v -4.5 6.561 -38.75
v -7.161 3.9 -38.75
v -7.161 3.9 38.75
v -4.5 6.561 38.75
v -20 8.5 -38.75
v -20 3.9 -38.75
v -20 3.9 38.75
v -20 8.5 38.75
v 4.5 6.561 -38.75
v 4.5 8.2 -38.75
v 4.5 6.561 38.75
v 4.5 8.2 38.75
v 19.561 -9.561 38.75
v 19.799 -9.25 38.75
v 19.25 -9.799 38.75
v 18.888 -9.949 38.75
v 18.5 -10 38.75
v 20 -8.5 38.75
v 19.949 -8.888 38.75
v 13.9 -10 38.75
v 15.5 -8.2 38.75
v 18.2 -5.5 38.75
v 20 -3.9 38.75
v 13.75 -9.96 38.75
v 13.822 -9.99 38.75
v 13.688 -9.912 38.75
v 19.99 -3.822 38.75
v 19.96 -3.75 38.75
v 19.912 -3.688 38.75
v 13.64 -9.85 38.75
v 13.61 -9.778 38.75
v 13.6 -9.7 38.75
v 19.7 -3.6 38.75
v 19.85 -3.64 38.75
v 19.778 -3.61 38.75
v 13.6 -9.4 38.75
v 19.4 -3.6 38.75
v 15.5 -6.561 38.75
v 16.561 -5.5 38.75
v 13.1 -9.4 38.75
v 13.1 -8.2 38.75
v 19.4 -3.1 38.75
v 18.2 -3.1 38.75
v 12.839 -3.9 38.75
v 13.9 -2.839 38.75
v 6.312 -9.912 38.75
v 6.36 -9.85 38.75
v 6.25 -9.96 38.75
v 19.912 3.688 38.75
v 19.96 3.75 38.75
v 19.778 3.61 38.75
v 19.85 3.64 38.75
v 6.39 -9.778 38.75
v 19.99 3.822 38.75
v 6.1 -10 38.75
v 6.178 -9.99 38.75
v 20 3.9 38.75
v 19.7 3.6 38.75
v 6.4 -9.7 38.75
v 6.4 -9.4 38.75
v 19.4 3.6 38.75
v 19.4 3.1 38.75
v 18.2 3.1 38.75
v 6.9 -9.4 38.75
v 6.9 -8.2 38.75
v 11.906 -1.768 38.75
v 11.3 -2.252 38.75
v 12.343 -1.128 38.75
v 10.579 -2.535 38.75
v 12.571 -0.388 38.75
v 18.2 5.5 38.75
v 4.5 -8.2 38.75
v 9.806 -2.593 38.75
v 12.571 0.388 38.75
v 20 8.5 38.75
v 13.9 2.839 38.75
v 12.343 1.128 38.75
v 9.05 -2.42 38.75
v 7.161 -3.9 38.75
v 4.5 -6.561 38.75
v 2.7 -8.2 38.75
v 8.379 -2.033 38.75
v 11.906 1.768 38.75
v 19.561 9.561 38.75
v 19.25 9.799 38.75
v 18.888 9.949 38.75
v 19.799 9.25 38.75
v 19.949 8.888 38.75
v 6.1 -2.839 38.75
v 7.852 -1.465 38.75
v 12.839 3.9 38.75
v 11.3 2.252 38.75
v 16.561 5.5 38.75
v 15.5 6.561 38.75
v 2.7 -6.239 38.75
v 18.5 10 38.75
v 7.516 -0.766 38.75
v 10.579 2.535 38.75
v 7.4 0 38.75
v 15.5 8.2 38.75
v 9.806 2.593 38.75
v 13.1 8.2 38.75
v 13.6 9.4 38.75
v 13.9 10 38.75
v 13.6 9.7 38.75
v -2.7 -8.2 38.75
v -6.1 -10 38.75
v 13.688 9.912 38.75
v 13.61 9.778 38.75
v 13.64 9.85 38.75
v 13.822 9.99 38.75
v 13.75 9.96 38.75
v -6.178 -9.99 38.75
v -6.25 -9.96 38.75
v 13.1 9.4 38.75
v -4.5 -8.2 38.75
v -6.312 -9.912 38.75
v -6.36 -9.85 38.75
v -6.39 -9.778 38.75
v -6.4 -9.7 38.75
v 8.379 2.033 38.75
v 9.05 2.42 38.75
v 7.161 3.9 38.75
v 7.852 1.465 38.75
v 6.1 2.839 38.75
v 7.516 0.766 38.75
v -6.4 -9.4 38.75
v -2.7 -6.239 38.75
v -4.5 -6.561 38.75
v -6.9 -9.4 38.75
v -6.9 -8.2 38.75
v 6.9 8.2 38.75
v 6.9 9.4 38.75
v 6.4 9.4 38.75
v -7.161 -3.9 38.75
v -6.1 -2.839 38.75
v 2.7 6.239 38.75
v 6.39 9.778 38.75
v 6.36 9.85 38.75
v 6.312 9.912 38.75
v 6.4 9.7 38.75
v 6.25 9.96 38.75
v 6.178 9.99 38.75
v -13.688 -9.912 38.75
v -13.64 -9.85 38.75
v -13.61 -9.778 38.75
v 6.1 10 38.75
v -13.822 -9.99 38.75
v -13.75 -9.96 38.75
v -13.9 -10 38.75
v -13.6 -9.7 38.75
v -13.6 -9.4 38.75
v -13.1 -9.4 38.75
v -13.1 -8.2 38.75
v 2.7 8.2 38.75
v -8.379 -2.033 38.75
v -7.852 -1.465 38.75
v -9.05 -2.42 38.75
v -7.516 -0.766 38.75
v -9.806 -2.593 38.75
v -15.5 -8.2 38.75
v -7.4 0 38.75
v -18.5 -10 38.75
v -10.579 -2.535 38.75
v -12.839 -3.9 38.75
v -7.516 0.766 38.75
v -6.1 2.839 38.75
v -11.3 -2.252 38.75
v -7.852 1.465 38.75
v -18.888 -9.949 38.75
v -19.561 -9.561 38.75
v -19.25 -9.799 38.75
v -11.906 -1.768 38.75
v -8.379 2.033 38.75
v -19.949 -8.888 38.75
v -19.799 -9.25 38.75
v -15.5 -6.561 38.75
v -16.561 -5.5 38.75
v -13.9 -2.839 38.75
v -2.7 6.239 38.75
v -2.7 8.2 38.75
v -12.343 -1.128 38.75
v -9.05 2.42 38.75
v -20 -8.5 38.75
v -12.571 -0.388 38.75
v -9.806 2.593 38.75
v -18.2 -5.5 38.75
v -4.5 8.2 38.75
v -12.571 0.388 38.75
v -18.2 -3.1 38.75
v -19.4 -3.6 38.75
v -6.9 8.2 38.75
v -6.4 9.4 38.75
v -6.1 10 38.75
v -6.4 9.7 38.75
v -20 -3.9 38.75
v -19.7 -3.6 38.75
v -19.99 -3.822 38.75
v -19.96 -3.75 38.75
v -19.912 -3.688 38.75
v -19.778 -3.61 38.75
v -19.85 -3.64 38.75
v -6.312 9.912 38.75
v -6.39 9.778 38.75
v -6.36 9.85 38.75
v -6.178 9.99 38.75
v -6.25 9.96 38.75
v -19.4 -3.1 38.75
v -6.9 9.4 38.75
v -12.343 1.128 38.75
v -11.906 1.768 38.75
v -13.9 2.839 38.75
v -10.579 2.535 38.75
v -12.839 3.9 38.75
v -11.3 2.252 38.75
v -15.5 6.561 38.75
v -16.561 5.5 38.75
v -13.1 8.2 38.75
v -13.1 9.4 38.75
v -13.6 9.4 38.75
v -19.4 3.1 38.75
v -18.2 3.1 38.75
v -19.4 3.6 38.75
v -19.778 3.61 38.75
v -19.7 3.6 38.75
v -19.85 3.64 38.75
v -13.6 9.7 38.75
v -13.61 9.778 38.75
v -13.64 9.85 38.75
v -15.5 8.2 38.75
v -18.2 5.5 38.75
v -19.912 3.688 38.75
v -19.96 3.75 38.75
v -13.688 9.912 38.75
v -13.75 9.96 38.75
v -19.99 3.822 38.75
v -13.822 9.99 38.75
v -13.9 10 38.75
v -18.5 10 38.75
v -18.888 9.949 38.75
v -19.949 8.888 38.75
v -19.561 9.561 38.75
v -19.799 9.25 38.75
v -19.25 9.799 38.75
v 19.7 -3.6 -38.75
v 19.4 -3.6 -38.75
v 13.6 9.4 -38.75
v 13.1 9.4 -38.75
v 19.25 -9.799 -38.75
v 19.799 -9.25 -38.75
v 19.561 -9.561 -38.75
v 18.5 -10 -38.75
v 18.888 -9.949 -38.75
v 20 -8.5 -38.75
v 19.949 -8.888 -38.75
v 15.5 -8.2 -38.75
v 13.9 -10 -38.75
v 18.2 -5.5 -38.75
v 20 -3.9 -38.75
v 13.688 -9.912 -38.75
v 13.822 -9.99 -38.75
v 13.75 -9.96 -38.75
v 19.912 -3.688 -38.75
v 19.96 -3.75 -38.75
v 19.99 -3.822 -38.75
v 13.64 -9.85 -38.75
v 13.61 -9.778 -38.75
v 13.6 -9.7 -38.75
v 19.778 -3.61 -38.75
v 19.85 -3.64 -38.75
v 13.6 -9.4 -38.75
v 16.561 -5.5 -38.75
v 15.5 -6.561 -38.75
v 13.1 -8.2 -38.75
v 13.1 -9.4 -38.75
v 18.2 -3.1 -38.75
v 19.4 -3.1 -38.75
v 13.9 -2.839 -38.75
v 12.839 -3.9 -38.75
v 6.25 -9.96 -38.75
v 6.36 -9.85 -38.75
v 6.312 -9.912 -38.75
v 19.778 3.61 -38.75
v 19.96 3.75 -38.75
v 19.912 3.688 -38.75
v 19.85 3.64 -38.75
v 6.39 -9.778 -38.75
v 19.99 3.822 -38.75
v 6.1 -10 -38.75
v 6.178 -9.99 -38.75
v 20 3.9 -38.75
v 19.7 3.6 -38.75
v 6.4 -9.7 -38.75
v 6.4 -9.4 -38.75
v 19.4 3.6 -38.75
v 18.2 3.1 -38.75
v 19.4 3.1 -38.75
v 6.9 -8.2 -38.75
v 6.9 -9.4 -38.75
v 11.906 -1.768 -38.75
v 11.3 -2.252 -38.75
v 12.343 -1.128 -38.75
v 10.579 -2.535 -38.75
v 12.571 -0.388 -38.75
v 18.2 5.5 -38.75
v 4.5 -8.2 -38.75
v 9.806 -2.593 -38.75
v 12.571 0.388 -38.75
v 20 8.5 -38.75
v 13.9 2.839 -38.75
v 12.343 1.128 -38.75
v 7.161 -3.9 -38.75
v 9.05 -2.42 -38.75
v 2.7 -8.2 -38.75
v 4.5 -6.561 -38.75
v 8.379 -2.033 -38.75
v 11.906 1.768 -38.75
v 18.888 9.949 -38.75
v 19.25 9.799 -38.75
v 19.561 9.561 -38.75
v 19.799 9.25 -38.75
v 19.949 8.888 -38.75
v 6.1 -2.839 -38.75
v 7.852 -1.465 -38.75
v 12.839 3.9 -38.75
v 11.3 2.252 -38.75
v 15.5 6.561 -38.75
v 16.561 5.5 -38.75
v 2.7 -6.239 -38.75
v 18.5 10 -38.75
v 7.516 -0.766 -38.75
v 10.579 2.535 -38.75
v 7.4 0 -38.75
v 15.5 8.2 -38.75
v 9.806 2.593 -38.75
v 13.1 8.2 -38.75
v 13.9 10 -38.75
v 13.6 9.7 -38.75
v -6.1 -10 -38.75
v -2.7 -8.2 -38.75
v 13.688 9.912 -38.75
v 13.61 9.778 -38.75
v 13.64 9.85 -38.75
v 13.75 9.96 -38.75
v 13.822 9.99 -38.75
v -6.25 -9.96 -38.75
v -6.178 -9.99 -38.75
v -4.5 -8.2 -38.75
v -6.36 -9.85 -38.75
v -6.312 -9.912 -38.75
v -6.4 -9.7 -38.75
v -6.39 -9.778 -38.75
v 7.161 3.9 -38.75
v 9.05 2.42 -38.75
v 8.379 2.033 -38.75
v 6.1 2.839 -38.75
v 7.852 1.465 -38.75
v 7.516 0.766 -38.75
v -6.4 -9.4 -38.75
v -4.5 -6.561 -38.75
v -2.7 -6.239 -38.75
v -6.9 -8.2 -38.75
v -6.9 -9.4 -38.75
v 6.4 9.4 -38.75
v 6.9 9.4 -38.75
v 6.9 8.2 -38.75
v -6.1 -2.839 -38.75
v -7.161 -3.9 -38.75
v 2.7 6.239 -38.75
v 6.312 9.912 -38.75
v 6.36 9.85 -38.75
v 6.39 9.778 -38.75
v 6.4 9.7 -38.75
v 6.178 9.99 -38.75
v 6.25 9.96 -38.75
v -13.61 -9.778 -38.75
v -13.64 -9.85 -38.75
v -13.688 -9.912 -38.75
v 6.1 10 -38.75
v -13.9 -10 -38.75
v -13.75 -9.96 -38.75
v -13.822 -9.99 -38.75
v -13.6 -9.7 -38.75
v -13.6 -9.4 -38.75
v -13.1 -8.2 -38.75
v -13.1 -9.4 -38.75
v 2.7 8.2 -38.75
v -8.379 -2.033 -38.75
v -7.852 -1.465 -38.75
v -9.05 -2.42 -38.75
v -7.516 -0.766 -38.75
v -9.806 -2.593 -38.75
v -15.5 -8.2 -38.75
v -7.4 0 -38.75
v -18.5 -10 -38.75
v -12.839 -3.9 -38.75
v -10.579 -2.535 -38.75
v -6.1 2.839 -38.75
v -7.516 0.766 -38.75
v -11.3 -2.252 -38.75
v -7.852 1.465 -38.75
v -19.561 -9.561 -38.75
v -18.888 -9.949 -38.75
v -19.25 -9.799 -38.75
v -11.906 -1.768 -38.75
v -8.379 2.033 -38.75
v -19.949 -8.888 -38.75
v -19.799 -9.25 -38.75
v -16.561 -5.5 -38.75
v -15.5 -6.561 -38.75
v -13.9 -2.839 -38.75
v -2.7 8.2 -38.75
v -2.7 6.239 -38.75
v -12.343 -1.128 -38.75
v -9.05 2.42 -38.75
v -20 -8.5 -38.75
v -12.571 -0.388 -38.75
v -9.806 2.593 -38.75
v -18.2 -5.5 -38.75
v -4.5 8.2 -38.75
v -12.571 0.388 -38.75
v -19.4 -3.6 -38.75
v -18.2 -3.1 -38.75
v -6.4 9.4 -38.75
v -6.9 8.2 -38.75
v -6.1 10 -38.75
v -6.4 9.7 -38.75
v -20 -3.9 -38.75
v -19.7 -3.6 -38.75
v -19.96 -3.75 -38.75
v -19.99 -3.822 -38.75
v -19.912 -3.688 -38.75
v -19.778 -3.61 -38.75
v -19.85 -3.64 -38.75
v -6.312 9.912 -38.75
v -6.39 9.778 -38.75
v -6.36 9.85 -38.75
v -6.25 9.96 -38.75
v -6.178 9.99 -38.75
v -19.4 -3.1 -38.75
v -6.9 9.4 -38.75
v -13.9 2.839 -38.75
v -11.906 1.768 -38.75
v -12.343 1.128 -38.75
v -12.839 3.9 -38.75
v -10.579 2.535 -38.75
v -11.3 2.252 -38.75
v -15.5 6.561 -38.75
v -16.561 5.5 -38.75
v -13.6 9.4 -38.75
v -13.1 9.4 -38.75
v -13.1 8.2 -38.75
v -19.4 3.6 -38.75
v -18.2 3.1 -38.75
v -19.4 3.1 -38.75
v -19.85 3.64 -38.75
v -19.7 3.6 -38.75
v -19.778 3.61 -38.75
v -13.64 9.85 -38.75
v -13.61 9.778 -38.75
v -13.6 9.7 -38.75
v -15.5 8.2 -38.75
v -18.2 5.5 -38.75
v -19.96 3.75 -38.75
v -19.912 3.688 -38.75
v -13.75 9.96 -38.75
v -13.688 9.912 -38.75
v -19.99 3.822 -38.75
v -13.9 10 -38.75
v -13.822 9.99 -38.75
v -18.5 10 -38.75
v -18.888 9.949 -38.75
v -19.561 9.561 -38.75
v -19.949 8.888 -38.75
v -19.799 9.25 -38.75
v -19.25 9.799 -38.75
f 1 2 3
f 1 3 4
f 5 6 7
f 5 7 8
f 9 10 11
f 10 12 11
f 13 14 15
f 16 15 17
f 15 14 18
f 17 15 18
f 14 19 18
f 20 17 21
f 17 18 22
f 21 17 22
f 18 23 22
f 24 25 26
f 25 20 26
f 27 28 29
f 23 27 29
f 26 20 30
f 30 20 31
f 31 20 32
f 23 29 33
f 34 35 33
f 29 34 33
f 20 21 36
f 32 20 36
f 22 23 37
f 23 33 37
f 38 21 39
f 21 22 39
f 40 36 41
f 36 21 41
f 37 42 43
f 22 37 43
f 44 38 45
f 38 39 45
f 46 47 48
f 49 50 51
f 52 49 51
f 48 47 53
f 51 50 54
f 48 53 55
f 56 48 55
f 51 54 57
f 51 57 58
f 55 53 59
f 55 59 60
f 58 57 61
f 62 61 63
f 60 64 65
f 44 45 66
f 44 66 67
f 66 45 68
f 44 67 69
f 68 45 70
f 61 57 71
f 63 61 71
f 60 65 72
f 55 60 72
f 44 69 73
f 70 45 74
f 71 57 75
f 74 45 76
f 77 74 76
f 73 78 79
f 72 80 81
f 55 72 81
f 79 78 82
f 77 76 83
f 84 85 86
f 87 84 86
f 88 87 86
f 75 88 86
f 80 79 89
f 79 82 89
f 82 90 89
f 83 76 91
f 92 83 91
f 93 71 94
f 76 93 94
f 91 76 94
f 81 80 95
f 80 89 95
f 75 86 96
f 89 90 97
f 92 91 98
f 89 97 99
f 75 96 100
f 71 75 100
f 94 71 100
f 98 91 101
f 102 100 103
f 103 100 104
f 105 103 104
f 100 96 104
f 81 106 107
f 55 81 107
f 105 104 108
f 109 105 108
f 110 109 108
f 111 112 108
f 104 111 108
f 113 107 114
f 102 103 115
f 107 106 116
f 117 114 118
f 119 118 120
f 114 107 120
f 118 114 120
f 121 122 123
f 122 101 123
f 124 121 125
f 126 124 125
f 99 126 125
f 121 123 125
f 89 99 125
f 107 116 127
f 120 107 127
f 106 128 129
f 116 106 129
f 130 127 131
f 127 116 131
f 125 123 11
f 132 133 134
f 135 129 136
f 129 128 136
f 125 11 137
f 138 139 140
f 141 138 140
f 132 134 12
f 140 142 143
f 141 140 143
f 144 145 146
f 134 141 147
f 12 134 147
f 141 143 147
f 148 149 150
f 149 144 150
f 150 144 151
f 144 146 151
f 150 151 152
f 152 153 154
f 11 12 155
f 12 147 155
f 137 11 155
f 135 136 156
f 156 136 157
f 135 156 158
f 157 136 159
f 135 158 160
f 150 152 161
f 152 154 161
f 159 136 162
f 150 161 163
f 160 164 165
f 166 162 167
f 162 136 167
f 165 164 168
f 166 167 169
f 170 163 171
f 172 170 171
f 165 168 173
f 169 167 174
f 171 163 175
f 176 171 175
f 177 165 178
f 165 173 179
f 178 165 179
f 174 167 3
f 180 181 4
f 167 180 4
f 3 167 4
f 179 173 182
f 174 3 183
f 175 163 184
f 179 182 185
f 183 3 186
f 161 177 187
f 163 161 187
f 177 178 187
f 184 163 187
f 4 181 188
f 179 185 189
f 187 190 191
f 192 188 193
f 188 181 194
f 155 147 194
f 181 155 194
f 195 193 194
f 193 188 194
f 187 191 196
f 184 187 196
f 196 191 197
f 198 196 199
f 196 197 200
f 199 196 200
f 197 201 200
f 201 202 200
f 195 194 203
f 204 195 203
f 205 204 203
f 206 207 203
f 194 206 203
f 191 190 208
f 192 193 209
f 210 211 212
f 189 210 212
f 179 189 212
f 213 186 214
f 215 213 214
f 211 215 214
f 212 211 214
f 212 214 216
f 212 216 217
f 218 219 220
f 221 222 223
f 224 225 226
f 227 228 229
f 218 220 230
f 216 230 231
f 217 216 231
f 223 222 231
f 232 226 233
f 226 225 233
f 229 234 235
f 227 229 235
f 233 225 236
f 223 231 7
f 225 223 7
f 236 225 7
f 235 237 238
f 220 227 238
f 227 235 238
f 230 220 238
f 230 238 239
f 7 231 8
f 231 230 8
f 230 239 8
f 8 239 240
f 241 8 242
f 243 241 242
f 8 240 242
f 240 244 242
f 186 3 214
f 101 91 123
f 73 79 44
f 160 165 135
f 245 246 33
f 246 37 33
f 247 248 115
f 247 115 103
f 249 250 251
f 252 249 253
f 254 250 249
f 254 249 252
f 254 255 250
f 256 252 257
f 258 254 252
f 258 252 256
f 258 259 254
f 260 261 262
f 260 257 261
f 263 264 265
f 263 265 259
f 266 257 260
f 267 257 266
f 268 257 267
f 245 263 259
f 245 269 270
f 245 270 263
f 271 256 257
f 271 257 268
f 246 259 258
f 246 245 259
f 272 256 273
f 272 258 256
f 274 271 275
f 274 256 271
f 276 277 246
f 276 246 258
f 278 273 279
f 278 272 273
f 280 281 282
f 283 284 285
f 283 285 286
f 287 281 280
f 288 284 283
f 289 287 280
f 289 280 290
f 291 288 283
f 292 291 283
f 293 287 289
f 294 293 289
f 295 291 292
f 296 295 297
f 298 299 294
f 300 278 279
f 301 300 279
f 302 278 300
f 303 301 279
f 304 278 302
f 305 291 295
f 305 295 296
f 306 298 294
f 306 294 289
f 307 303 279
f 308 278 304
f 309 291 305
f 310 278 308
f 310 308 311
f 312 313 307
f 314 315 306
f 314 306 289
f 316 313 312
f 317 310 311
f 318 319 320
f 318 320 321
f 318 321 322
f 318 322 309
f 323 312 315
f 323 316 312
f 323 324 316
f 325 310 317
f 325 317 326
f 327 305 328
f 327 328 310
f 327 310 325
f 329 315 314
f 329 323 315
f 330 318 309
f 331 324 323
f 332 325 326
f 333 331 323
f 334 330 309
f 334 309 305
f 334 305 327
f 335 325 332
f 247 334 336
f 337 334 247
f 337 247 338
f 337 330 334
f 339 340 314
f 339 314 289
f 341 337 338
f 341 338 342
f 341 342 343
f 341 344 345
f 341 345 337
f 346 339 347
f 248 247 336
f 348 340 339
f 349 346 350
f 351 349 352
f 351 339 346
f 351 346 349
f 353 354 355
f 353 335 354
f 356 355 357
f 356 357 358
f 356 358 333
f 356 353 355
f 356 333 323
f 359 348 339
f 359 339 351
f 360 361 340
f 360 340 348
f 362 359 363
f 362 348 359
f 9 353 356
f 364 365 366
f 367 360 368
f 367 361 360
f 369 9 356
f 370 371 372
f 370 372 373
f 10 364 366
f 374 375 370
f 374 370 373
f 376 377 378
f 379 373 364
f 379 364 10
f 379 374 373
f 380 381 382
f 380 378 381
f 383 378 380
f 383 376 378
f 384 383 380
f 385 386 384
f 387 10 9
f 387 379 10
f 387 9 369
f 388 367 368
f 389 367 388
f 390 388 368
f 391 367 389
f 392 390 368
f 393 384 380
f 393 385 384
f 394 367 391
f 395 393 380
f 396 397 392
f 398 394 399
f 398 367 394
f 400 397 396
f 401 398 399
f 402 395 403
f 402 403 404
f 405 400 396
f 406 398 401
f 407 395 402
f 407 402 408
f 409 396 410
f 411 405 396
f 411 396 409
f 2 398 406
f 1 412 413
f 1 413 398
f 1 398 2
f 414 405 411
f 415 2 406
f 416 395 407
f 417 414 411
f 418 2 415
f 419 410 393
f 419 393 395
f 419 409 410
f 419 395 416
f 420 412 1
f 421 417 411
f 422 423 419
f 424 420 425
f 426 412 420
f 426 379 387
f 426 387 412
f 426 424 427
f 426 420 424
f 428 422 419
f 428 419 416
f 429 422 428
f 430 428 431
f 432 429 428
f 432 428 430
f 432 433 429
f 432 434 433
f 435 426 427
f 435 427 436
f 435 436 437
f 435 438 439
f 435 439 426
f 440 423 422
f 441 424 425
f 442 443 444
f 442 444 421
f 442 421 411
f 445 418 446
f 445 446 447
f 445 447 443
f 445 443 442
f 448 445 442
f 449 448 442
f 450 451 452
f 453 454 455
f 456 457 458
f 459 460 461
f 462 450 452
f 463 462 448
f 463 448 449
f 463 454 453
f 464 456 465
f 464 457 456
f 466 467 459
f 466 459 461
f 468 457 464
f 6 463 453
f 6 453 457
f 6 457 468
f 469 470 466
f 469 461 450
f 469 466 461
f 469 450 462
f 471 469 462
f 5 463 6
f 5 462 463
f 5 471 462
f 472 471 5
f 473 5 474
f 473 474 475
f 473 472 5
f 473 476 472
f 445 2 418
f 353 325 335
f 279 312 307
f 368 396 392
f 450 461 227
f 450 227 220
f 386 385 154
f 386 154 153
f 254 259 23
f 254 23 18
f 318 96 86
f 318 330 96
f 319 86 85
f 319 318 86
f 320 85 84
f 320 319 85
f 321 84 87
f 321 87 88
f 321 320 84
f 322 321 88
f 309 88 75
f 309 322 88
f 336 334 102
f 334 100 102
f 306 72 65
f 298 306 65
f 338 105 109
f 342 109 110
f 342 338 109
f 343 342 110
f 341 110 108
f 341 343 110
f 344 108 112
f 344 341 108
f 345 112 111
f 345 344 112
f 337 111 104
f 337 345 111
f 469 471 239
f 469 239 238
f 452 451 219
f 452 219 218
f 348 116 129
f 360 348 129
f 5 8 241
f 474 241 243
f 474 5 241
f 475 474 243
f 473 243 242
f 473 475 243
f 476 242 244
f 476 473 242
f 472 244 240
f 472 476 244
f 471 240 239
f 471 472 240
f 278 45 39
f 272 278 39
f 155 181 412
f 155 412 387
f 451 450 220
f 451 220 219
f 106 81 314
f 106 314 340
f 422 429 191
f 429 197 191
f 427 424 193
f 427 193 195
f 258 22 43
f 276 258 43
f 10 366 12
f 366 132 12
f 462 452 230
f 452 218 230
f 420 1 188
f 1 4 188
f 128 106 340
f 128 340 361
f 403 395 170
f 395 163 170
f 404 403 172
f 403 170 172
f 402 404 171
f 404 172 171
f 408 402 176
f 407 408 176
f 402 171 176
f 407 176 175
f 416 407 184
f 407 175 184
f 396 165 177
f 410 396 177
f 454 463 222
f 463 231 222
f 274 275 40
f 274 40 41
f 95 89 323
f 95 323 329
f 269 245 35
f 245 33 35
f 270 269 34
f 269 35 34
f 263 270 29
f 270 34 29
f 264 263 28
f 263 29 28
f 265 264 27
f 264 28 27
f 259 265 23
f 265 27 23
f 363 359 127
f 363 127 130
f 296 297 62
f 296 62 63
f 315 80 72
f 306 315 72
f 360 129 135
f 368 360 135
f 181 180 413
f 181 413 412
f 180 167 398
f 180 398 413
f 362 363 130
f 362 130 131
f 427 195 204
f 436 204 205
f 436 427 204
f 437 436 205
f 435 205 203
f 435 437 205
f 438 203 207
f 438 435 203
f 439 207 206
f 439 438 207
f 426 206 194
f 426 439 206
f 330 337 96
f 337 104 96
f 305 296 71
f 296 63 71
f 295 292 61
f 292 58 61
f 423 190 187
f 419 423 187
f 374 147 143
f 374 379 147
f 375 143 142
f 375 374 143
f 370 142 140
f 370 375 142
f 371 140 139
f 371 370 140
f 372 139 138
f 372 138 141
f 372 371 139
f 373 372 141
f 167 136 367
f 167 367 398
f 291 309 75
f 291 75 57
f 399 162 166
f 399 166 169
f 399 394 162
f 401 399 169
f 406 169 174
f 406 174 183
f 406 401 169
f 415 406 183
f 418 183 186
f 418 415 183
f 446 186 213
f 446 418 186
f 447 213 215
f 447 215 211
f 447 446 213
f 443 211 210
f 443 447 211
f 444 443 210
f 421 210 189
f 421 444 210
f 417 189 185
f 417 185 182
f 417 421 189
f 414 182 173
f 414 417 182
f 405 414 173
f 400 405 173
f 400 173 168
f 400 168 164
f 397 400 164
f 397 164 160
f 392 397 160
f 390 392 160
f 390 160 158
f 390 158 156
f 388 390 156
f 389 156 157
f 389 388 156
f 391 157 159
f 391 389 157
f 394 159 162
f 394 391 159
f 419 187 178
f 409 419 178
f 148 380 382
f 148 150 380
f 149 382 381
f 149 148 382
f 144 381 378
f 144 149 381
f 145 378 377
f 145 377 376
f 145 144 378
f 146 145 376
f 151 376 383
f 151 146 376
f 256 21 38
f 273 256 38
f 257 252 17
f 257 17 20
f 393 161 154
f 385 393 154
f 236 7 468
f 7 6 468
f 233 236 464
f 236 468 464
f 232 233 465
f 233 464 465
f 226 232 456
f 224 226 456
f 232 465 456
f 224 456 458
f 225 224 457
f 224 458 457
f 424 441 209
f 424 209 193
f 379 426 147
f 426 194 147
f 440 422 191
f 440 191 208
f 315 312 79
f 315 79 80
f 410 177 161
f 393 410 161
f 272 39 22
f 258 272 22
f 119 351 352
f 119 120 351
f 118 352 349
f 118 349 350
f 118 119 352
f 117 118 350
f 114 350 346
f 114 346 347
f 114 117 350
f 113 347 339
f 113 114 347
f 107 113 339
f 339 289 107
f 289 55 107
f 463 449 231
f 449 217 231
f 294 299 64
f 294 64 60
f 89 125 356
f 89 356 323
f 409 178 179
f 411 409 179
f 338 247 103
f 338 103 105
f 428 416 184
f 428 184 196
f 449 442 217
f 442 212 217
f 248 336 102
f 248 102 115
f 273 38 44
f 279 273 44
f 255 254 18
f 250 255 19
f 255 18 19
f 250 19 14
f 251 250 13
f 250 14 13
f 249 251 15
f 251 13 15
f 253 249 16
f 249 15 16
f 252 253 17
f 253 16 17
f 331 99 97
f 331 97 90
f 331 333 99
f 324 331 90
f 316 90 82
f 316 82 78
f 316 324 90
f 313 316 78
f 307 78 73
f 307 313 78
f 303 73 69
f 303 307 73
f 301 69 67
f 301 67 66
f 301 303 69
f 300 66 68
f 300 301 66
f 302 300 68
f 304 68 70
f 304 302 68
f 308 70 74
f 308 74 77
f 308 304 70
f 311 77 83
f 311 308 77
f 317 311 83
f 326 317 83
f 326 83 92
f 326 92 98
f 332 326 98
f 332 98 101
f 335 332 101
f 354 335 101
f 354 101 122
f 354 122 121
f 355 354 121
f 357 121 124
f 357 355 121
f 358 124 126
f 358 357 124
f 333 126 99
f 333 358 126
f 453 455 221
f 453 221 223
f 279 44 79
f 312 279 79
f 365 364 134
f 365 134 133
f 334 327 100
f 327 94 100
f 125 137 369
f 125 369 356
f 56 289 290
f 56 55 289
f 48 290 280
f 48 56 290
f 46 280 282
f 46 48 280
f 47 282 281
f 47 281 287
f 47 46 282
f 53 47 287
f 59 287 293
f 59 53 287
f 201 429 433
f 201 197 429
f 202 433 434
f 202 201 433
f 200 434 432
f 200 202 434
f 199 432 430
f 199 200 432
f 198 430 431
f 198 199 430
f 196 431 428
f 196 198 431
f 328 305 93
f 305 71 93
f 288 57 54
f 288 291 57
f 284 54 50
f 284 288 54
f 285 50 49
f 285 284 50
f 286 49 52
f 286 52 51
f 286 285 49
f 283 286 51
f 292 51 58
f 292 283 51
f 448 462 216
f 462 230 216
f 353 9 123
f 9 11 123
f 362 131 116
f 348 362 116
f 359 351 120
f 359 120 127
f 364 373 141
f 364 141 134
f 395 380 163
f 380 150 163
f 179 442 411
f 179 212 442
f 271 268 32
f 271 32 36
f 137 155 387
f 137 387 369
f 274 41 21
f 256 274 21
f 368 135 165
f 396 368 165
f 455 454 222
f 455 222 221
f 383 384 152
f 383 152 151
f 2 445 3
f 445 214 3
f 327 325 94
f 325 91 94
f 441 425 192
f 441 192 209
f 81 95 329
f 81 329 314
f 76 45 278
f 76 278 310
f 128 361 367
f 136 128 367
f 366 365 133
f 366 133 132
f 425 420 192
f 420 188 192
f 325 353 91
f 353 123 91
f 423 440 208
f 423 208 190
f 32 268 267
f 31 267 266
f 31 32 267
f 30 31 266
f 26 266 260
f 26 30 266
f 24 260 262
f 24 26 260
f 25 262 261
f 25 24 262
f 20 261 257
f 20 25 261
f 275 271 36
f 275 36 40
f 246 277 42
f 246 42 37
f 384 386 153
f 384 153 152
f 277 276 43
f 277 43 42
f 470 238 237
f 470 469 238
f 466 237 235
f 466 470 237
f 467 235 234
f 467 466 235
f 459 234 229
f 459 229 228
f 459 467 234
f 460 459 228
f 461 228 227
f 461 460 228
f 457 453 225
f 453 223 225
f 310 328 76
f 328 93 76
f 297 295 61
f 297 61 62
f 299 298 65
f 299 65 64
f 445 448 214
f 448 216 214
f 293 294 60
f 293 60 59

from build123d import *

# Parameters (mm, degrees)
SKETCH_1_R      = 2.6
EXTRUDE_1_DEPTH = 38.75
FILLET_1_R      = 1.5
FILLET_2_R      = 0.3


with BuildPart() as part:
    # 草图1 → 凸台-拉伸1 (new, symmetric)
    with BuildSketch(Plane.XY):
        Polygon((-13.9, 0), (-13.9, 2.839339828), (-16.560660172, 5.5), (-18.2, 5.5), (-18.2, 3.1), (-19.4, 3.1), (-19.4, 3.6), (-20, 3.6), (-20, 10), (-13.6, 10), (-13.6, 9.4), (-13.1, 9.4), (-13.1, 8.2), (-15.5, 8.2), (-15.5, 6.560660172), (-12.839339828, 3.9), (-7.160660172, 3.9), (-4.5, 6.560660172), (-4.5, 8.2), (-6.9, 8.2), (-6.9, 9.4), (-6.4, 9.4), (-6.4, 10), (6.4, 10), (6.4, 9.4), (6.9, 9.4), (6.9, 8.2), (4.5, 8.2), (4.5, 6.560660172), (7.160660172, 3.9), (12.839339828, 3.9), (15.5, 6.560660172), (15.5, 8.2), (13.1, 8.2), (13.1, 9.4), (13.6, 9.4), (13.6, 10), (20, 10), (20, 3.6), (19.4, 3.6), (19.4, 3.1), (18.2, 3.1), (18.2, 5.5), (16.560660172, 5.5), (13.9, 2.839339828), (13.9, 0), (13.9, -2.839339828), (16.560660172, -5.5), (18.2, -5.5), (18.2, -3.1), (19.4, -3.1), (19.4, -3.6), (20, -3.6), (20, -10), (13.6, -10), (13.6, -9.4), (13.1, -9.4), (13.1, -8.2), (15.5, -8.2), (15.5, -6.560660172), (12.839339828, -3.9), (7.160660172, -3.9), (4.5, -6.560660172), (4.5, -8.2), (6.9, -8.2), (6.9, -9.4), (6.4, -9.4), (6.4, -10), (-6.4, -10), (-6.4, -9.4), (-6.9, -9.4), (-6.9, -8.2), (-4.5, -8.2), (-4.5, -6.560660172), (-7.160660172, -3.9), (-12.839339828, -3.9), (-15.5, -6.560660172), (-15.5, -8.2), (-13.1, -8.2), (-13.1, -9.4), (-13.6, -9.4), (-13.6, -10), (-20, -10), (-20, -3.6), (-19.4, -3.6), (-19.4, -3.1), (-18.2, -3.1), (-18.2, -5.5), (-16.560660172, -5.5), (-13.9, -2.839339828), align=None)
        with Locations((-10, 0)):
            Circle(SKETCH_1_R, mode=Mode.SUBTRACT)
        with Locations(Location((10, 0, 0), (0, 0, 180))):
            Circle(SKETCH_1_R, mode=Mode.SUBTRACT)
        Polygon((-6.1, -2.839339828), (-6.1, 2.839339828), (-2.7, 6.239339828), (-2.7, 8.2), (2.7, 8.2), (2.7, 6.239339828), (6.1, 2.839339828), (6.1, -2.839339828), (2.7, -6.239339828), (2.7, -8.2), (-2.7, -8.2), (-2.7, -6.239339828), align=None, mode=Mode.SUBTRACT)
    extrude(amount=EXTRUDE_1_DEPTH, both=True)

    # 圆角1
    fillet_1_edges = [part.edges().sort_by_distance(p)[0] for p in [
        (-20, 10, 0),
        (20, 10, 0),
        (20, -10, 0),
        (-20, -10, 0),
    ]]
    fillet(fillet_1_edges, radius=FILLET_1_R)

    # 圆角2
    fillet_2_edges = [part.edges().sort_by_distance(p)[0] for p in [
        (-20, 3.6, 0),
        (-13.6, 10, 0),
        (-6.4, 10, 0),
        (6.4, 10, 0),
        (13.6, 10, 0),
        (20, 3.6, 0),
        (20, -3.6, 0),
        (13.6, -10, 0),
        (6.4, -10, 0),
        (-6.4, -10, 0),
        (-13.6, -10, 0),
        (-20, -3.6, 0),
    ]]
    fillet(fillet_2_edges, radius=FILLET_2_R)


solid = part.part
